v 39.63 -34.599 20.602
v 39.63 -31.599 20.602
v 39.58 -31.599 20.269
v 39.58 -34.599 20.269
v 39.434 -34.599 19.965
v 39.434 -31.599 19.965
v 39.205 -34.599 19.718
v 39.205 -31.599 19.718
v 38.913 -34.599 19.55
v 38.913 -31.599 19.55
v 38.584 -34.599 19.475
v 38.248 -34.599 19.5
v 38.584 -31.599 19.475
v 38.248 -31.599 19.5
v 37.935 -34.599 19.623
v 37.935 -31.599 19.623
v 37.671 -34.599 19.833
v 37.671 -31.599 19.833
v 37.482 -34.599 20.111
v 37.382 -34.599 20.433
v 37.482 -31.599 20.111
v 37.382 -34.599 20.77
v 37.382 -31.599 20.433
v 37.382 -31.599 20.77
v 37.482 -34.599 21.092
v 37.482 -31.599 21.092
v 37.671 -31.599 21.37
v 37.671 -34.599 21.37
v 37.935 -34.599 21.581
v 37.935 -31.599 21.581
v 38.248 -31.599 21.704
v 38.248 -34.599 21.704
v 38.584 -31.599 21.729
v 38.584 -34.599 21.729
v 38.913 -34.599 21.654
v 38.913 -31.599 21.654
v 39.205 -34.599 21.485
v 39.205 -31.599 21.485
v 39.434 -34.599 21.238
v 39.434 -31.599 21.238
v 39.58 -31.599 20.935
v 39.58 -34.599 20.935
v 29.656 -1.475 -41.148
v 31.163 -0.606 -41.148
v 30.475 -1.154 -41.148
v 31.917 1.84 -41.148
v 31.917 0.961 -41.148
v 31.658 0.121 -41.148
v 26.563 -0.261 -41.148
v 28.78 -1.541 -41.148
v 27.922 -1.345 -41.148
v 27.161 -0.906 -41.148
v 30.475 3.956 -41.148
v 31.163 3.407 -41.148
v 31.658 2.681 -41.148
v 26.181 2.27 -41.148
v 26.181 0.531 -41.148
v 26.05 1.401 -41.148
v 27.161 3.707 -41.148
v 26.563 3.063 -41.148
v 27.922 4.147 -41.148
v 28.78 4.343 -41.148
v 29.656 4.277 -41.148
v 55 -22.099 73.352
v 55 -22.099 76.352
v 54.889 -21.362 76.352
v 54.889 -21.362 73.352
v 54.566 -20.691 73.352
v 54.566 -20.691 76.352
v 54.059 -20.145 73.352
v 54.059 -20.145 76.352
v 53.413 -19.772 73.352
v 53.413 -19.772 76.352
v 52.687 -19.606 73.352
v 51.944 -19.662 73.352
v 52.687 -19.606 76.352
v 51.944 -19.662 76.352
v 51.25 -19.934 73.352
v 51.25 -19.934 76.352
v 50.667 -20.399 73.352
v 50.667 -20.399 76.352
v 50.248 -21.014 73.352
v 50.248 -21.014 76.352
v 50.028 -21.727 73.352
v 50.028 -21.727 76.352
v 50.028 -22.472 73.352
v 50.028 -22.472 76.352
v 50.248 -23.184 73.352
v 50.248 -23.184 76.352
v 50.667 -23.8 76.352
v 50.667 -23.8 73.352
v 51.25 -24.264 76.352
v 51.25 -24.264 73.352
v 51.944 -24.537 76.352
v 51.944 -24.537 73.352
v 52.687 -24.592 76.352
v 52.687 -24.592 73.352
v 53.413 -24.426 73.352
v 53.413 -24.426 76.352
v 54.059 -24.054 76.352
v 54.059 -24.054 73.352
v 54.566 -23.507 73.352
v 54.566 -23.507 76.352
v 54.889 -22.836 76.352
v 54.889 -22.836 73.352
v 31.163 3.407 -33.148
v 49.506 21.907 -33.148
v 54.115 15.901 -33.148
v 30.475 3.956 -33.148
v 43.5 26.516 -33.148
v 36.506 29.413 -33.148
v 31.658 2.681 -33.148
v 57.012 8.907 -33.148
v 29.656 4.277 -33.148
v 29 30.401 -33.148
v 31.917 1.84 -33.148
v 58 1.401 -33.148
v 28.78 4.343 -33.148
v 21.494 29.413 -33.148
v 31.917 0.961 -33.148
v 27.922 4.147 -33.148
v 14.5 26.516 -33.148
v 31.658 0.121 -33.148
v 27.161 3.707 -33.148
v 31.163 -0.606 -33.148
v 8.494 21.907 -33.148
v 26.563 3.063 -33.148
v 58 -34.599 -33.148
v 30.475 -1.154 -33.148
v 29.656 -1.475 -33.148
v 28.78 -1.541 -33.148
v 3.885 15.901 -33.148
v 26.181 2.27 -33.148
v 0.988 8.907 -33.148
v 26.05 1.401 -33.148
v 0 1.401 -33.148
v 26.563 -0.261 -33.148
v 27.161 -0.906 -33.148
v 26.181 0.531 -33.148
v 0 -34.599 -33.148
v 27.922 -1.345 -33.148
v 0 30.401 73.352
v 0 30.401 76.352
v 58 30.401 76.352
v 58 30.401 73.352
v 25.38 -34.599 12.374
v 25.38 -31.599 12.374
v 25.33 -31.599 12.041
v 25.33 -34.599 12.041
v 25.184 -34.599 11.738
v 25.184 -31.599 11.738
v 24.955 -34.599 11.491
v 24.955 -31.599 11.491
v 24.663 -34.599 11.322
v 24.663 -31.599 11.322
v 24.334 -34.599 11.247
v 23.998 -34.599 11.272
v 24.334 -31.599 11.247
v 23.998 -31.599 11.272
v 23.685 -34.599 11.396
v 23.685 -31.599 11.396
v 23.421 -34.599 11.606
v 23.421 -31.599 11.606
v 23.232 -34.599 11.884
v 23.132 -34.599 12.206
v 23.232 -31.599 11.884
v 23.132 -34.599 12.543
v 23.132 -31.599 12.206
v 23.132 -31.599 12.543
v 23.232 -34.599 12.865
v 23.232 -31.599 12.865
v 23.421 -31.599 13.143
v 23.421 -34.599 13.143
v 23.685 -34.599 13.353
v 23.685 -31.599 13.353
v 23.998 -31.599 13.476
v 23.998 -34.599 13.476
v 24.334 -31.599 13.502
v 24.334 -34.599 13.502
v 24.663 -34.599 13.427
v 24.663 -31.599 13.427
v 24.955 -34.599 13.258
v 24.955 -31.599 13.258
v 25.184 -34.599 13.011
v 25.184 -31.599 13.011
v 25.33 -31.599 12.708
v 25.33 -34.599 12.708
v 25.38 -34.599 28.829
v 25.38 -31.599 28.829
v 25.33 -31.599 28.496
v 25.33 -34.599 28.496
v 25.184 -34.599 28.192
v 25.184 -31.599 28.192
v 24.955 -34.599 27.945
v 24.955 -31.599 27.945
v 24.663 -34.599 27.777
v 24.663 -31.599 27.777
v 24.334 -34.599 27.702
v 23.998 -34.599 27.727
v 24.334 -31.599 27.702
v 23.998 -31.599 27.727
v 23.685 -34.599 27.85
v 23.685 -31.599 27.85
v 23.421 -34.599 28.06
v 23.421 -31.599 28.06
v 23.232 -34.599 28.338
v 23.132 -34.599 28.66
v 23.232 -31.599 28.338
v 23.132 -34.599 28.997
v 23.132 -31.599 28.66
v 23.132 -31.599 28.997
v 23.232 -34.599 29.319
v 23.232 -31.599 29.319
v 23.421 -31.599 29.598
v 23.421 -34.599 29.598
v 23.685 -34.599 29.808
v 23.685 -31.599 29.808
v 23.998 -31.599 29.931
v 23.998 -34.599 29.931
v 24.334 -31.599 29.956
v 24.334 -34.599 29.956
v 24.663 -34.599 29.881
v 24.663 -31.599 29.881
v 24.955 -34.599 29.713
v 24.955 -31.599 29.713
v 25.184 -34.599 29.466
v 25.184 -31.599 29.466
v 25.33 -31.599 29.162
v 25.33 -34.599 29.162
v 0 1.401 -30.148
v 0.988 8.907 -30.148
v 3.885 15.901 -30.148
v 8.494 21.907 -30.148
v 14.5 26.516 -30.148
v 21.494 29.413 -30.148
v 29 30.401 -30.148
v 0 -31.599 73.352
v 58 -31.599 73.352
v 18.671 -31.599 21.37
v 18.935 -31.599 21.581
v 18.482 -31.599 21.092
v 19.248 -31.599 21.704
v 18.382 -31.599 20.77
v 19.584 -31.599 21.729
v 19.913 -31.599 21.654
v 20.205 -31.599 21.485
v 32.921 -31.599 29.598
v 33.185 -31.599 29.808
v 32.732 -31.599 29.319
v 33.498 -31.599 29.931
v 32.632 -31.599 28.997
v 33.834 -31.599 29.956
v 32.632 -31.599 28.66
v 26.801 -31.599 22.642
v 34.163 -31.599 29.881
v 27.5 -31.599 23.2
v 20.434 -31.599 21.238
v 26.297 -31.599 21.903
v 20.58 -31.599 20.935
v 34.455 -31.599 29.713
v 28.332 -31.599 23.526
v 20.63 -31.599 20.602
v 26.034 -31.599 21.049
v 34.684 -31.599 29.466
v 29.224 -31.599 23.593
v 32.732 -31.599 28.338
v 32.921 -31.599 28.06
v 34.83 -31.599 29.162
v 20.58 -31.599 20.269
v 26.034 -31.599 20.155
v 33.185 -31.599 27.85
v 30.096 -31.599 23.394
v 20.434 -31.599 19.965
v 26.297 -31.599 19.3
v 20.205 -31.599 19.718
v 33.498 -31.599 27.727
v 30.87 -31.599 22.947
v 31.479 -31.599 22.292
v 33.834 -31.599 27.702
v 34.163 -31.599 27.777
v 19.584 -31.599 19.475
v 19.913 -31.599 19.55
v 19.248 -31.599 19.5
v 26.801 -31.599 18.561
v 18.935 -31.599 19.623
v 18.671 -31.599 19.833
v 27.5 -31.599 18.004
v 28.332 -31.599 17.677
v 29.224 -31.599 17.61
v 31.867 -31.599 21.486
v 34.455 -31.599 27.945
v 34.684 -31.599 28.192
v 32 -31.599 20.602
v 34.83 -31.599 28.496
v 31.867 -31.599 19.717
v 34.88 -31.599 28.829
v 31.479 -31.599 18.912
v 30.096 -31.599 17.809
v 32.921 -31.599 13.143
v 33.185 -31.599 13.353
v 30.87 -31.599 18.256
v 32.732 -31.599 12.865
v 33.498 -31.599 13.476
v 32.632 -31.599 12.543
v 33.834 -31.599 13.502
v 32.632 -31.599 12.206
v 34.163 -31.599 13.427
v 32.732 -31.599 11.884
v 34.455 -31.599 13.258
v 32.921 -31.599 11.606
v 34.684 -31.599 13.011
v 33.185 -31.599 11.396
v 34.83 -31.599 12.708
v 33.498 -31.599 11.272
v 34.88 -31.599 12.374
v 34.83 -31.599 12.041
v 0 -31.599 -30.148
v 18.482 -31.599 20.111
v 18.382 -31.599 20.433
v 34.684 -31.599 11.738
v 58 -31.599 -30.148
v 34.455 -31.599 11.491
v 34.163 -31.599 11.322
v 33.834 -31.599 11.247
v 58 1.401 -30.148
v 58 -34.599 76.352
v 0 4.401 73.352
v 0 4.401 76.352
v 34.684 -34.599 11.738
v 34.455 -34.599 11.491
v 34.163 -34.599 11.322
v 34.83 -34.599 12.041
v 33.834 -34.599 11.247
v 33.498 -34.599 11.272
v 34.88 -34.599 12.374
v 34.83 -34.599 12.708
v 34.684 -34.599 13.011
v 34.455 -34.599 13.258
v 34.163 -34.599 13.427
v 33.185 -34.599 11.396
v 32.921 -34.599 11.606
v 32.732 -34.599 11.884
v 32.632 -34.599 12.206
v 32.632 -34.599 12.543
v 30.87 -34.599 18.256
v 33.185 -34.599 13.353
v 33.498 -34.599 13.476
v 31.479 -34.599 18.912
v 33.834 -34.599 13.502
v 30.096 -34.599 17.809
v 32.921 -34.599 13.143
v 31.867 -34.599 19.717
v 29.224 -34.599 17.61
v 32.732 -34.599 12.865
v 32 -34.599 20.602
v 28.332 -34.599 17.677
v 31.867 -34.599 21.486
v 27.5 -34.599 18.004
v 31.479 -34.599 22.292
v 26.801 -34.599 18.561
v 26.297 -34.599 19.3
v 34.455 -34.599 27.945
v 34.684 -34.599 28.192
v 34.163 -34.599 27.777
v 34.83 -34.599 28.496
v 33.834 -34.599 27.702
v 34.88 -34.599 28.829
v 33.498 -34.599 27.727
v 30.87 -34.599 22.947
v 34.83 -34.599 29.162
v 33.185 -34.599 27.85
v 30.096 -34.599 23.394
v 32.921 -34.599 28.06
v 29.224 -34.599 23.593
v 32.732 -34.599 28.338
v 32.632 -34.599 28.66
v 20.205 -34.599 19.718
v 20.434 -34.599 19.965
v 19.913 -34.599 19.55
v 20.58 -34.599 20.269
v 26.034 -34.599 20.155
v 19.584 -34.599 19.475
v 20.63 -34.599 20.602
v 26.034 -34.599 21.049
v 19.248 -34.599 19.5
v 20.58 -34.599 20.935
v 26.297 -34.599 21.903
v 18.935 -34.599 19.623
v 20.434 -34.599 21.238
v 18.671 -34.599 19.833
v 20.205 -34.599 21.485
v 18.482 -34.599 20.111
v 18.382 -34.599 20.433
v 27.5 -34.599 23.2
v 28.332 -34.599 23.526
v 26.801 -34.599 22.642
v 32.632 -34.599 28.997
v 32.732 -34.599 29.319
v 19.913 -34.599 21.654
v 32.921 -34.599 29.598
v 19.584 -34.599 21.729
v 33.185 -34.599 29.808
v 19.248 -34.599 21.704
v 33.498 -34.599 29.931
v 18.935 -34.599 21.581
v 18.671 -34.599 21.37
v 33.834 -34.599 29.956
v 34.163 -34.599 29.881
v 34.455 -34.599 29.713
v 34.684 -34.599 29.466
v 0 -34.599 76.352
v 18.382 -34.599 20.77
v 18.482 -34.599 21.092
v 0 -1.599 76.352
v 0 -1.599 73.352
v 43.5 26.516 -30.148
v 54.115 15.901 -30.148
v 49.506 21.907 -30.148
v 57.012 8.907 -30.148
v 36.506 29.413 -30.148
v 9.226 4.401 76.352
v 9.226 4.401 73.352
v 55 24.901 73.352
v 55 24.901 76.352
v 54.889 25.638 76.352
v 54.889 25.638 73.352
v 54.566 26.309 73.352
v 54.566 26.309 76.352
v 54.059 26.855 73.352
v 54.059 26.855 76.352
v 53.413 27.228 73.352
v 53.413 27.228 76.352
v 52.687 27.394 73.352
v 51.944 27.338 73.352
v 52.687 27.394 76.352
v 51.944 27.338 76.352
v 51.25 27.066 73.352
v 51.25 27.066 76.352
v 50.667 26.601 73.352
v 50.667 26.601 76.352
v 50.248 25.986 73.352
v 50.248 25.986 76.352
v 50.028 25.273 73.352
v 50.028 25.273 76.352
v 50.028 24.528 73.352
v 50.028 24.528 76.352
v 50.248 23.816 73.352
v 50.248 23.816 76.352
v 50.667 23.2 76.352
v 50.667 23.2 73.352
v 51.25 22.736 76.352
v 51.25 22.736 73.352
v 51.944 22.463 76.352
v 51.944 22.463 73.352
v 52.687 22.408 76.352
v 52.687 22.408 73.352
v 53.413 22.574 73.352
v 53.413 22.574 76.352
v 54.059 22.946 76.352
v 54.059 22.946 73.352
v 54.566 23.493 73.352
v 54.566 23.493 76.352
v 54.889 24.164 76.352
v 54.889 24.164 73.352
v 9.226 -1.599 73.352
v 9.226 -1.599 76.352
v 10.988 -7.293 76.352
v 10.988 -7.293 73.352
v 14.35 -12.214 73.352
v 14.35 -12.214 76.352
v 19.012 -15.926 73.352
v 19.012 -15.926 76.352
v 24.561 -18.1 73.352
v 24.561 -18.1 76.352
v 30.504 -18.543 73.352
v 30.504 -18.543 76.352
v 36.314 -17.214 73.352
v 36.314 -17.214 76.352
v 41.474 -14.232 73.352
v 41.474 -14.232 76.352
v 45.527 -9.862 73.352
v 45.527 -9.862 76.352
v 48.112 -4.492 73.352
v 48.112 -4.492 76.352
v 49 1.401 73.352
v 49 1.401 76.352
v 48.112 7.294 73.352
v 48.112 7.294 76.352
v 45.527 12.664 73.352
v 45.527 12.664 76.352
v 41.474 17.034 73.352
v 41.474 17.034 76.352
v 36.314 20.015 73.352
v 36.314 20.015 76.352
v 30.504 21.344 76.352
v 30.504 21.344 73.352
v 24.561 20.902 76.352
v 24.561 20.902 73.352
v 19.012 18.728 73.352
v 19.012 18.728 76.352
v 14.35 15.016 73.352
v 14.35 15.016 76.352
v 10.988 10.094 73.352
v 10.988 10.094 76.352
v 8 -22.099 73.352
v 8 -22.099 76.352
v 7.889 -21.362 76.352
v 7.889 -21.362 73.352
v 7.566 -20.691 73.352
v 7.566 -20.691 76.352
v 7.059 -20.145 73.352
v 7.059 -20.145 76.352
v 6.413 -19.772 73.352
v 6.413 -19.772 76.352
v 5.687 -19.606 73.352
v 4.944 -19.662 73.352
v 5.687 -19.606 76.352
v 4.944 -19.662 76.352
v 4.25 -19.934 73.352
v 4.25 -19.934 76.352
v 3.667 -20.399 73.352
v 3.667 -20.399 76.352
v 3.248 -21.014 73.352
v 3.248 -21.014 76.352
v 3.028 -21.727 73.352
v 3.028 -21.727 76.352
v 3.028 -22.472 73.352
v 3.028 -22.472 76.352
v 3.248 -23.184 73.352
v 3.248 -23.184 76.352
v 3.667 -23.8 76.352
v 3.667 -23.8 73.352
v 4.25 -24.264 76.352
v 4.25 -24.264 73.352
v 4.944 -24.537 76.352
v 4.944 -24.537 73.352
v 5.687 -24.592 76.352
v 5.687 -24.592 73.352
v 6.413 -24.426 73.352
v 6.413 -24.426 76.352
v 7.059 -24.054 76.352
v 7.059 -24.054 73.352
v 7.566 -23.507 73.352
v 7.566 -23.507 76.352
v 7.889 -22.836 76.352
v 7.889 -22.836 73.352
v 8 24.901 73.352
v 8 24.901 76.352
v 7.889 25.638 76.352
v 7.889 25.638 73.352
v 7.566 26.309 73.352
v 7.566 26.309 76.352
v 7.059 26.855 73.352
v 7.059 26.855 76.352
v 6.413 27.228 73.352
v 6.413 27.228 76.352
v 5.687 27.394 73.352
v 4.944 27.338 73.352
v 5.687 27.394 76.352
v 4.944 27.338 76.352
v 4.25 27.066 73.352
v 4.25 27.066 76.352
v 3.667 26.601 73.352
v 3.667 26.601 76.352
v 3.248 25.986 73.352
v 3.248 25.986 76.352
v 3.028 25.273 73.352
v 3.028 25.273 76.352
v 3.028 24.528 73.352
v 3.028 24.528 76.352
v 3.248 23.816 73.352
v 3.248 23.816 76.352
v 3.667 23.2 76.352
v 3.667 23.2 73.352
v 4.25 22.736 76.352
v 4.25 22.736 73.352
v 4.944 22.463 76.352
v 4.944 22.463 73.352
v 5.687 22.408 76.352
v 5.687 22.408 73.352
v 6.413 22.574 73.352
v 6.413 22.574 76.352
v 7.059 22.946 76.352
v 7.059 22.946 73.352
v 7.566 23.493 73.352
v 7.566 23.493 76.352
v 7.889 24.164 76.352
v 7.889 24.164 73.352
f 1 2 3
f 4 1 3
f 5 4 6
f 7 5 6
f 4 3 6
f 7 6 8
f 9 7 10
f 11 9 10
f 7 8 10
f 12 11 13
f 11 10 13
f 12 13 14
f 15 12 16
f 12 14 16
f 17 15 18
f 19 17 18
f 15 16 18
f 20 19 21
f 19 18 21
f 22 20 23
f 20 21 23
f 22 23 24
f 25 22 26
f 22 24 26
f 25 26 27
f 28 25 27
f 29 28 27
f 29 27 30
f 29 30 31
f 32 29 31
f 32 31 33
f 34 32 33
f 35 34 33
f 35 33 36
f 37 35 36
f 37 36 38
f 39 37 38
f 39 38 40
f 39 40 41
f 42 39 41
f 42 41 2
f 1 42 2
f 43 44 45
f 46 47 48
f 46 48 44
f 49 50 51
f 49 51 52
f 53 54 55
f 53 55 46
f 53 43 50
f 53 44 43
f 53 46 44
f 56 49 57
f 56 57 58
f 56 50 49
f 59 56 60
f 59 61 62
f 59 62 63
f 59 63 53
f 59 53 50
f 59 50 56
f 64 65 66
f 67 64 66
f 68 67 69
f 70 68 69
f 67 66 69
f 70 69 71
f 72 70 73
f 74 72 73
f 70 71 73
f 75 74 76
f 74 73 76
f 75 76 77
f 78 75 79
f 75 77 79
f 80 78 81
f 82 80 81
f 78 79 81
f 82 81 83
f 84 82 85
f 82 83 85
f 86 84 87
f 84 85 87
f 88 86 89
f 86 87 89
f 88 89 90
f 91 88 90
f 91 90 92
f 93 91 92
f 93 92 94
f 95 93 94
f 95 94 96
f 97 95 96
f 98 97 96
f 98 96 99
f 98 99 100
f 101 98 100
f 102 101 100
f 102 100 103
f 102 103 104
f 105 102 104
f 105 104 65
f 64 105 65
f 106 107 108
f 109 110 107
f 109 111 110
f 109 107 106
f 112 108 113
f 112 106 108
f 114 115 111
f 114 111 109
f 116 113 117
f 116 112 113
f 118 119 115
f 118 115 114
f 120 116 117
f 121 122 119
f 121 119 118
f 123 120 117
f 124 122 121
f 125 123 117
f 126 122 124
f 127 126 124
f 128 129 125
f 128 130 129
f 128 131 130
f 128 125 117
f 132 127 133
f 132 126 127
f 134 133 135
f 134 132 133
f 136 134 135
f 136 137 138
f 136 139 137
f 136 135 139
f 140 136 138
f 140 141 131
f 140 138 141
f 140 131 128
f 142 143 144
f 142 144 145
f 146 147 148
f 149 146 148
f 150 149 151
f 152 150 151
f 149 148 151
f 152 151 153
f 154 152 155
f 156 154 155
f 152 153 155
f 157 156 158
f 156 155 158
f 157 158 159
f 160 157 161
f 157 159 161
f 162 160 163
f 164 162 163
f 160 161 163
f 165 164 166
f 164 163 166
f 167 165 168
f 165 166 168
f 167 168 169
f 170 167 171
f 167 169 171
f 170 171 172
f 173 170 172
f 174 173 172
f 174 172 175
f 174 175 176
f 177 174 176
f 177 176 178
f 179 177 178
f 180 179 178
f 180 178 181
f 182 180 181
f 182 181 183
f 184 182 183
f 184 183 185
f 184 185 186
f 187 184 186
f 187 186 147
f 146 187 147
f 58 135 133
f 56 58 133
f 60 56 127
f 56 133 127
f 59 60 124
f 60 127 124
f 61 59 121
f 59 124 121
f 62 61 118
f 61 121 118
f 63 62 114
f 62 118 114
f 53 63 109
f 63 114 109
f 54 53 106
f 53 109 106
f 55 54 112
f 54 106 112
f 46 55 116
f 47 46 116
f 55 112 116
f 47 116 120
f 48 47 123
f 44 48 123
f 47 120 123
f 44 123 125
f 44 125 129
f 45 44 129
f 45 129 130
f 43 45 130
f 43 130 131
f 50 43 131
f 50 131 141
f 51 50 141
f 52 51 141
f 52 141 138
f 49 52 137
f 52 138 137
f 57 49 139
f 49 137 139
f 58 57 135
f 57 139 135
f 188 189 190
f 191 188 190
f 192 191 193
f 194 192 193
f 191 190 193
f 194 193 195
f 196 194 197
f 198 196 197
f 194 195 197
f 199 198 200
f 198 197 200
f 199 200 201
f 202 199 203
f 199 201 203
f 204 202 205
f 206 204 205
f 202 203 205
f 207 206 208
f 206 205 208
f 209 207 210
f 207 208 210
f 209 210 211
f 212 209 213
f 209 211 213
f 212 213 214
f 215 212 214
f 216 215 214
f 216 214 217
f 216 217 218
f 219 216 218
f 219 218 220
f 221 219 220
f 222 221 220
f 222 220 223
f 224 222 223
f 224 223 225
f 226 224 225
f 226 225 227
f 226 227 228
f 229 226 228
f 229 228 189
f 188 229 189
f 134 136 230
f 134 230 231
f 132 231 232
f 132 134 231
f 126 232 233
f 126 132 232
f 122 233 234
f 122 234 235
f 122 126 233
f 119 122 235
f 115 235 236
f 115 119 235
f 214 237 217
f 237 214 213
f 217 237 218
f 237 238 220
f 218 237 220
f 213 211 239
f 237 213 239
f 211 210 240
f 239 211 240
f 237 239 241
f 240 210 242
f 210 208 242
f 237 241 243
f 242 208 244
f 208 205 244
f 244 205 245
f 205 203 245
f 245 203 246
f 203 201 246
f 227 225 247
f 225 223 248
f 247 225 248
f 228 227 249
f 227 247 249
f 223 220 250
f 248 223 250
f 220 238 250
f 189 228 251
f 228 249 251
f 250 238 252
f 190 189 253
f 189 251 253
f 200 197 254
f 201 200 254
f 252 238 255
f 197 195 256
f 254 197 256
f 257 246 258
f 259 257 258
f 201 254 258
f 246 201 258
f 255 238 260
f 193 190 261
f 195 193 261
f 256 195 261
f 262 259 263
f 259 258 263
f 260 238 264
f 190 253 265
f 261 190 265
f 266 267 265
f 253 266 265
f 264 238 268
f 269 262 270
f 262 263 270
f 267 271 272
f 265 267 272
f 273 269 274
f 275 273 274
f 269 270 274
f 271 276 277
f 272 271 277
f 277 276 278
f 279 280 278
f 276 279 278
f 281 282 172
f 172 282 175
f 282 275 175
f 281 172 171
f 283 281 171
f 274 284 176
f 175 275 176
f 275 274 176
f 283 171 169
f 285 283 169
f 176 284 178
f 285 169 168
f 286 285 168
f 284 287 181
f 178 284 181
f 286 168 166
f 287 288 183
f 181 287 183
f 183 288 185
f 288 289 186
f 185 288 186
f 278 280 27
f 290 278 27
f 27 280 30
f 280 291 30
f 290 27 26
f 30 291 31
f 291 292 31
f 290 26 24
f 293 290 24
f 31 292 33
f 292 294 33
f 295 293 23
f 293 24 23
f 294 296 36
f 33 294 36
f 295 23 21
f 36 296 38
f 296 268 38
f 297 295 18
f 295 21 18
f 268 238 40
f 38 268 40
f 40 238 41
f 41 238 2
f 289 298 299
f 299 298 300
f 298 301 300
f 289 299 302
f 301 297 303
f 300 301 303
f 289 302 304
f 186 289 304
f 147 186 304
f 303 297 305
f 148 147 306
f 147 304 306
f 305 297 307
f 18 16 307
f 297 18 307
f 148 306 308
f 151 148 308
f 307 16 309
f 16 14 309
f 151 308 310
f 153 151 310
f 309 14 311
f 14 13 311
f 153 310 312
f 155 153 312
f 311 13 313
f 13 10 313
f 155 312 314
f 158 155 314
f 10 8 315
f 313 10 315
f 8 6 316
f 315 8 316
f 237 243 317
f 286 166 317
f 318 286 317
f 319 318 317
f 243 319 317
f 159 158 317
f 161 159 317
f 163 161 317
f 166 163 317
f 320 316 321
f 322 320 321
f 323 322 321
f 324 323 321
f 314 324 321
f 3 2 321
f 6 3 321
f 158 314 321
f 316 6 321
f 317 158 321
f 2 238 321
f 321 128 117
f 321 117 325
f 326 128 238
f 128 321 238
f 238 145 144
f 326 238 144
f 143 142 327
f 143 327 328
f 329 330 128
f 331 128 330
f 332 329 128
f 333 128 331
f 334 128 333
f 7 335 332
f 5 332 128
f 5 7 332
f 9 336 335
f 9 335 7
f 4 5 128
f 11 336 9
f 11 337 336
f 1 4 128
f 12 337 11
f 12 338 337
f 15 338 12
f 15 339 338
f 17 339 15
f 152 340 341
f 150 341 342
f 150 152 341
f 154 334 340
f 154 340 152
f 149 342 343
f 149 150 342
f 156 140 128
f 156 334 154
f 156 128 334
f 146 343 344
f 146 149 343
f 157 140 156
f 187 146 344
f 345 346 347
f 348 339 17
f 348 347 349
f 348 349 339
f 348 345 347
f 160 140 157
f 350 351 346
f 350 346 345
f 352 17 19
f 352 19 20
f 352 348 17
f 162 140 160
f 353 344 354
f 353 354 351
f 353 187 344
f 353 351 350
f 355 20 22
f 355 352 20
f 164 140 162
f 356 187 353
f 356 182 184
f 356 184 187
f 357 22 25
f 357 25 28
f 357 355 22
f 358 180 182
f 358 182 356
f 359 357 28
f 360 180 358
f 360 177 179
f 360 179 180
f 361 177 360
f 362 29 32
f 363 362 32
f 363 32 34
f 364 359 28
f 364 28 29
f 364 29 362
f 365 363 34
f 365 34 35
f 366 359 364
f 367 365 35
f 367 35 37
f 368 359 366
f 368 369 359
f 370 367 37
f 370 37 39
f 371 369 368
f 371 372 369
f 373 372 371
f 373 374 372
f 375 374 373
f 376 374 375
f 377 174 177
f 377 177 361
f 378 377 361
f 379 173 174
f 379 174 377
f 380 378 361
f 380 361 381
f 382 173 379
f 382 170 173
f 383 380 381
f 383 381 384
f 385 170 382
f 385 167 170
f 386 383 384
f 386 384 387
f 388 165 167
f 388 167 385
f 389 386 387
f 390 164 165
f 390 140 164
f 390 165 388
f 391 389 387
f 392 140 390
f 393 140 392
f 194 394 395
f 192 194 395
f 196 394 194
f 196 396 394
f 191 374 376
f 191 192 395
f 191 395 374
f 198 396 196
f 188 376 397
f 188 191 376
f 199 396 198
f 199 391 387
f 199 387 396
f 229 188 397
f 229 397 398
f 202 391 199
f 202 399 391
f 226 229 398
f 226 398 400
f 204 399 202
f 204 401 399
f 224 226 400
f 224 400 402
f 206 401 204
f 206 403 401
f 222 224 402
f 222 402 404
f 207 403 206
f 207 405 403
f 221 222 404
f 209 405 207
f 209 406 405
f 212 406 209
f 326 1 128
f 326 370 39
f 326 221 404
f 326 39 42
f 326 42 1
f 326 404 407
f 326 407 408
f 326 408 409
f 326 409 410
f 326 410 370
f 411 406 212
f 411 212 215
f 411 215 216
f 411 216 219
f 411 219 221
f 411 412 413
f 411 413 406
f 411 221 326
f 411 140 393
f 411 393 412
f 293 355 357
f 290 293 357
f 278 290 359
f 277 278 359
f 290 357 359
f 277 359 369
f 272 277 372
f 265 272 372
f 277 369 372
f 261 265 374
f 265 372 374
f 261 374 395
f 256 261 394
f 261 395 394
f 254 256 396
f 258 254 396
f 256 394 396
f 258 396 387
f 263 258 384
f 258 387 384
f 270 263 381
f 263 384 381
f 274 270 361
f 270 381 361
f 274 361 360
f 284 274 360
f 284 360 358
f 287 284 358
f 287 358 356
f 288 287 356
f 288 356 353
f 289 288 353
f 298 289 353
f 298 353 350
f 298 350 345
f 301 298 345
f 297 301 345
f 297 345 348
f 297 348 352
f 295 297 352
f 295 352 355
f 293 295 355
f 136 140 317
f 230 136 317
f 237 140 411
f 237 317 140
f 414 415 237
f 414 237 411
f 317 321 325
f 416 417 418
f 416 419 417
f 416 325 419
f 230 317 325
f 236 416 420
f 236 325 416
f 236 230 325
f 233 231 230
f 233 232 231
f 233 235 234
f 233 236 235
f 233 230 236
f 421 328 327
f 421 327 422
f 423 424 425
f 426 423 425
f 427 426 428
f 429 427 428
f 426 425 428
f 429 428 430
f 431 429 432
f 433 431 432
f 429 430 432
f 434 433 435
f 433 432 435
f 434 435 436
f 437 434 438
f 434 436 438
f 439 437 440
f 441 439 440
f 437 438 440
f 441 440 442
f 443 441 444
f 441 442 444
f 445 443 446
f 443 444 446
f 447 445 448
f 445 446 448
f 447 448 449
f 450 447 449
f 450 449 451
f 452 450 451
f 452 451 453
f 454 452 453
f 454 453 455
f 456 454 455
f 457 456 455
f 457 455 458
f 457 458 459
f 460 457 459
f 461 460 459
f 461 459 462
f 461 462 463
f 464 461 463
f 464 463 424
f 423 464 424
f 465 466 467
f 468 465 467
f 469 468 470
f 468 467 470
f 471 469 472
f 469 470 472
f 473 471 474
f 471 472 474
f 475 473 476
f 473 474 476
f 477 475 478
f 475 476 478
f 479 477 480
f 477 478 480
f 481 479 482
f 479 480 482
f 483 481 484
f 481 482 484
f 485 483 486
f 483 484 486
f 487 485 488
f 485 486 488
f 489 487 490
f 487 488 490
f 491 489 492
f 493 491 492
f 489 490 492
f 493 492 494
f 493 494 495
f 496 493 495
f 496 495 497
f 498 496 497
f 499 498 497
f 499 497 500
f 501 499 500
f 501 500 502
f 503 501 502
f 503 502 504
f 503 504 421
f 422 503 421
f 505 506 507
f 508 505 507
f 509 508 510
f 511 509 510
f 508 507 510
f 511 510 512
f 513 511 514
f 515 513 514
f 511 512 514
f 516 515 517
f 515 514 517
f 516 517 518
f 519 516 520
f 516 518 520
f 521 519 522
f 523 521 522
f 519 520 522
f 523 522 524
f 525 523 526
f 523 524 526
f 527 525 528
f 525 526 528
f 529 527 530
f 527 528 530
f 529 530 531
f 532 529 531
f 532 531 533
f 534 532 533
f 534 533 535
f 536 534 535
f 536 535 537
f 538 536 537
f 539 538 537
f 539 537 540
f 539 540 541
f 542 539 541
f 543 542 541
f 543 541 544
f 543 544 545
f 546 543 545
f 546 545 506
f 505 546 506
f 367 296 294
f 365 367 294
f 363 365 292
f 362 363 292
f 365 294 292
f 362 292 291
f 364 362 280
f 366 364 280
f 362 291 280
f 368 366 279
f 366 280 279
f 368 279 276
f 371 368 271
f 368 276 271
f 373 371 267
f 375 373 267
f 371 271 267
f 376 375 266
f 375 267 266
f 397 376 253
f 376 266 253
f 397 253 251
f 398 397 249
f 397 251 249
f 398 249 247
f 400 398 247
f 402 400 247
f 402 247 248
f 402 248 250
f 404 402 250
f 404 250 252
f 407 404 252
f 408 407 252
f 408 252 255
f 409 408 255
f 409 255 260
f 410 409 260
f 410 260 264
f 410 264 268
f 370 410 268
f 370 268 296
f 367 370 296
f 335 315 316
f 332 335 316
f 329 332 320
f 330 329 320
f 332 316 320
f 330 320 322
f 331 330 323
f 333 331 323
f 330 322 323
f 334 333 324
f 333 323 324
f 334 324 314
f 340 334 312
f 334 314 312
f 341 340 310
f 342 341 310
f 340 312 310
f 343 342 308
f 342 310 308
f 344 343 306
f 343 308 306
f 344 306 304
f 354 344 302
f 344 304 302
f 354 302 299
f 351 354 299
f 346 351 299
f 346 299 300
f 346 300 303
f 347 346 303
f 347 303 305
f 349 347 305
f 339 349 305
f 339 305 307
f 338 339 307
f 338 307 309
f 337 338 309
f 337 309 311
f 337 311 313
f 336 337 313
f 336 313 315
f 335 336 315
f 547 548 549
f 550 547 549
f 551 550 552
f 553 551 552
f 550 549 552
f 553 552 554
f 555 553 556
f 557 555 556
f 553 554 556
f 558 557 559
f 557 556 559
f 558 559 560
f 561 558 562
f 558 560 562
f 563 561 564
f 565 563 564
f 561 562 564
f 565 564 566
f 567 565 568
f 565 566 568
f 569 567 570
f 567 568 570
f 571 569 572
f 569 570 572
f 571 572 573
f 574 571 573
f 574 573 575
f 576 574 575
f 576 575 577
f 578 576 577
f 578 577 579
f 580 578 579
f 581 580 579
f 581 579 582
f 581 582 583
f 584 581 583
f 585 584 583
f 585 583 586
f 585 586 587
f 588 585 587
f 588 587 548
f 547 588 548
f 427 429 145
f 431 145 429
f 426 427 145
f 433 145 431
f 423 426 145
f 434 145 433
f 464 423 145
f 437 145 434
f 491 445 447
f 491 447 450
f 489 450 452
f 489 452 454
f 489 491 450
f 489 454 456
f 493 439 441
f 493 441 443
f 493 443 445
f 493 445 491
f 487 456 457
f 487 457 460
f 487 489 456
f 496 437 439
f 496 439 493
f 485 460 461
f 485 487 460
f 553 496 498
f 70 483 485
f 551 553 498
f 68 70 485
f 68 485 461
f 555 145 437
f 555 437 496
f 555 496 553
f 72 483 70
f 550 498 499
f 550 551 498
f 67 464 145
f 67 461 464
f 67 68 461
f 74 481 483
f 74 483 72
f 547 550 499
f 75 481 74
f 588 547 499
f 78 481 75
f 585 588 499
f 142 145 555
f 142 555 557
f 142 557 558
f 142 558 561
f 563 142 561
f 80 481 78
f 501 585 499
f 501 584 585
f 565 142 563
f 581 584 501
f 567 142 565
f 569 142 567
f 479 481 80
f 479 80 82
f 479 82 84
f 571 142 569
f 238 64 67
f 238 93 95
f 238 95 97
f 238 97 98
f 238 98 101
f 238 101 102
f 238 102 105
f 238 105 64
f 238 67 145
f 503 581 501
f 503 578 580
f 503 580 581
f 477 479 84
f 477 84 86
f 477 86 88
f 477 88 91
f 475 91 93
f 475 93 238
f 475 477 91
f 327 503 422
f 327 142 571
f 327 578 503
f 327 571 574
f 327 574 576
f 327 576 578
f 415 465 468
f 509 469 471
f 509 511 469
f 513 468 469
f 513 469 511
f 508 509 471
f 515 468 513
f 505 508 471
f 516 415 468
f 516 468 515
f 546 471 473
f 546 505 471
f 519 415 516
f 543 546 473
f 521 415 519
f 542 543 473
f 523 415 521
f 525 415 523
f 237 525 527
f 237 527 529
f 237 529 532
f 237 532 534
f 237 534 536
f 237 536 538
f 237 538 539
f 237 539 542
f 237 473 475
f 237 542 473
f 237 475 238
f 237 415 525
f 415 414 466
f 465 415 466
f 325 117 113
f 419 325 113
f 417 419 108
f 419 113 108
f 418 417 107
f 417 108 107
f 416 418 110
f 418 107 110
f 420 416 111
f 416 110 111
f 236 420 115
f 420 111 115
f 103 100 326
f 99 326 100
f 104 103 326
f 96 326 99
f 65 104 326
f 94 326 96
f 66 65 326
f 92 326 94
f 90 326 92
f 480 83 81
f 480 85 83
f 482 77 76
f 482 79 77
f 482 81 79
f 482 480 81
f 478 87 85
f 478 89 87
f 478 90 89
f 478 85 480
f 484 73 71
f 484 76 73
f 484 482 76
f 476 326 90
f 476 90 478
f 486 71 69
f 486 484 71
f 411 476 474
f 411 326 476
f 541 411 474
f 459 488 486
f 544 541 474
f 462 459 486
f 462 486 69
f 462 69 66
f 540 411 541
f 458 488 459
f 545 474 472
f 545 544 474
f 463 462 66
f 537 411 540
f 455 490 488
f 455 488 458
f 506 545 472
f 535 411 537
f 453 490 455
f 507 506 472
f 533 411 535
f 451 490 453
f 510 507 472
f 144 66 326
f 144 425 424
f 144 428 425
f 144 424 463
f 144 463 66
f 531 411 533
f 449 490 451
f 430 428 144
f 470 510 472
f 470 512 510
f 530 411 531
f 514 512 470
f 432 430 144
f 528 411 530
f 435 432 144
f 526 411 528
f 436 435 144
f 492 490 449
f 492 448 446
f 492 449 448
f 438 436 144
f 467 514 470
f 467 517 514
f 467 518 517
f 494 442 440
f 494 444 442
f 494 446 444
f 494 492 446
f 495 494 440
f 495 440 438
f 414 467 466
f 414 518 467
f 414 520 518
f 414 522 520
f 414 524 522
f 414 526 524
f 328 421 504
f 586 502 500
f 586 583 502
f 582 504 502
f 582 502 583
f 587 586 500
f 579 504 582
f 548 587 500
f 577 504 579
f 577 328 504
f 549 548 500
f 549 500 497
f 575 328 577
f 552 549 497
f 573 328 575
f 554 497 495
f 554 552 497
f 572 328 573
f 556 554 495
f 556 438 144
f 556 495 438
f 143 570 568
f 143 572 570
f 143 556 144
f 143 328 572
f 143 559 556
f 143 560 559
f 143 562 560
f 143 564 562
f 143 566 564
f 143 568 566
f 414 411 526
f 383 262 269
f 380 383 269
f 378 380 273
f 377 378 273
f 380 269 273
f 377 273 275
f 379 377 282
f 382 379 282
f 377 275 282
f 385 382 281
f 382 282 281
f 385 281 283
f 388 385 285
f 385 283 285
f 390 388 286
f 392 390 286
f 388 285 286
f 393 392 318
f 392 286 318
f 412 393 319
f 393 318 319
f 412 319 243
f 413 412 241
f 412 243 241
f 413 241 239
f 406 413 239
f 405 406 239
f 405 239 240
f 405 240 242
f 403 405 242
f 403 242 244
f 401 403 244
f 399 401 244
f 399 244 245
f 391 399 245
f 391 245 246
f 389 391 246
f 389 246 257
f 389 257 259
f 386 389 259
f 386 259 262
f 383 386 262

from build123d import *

# Parameters (mm, degrees)
BOSS_EXTRUDE1_DEPTH       = 58
SKETCH2_R                 = 2.5
SKETCH2_R_2               = 20
CUT_EXTRUDE1_DEPTH        = 58
CUT_EXTRUDE2_DEPTH        = 58
CUT_EXTRUDE3_DEPTH        = 58
SKETCH5_R                 = 2.95
BOSS_EXTRUDE2_DEPTH       = 8
SKETCH7_W                 = 29
SKETCH7_H                 = 6
CUT_EXTRUDE5_DEPTH        = 10
F_4_40_TAPPED_HOLE4_D     = 2.2606
F_4_40_TAPPED_HOLE4_DEPTH = 7.6
F_4_40_TAPPED_HOLE4_TIP   = 0.679152758
SKETCH25_R                = 3
CUT_EXTRUDE6_DEPTH        = 10
SKETCH26_W                = 103.5
SKETCH26_H                = 2
CUT_EXTRUDE7_DEPTH        = 90


with BuildPart() as part:
    # Sketch1 → Boss-Extrude1 (new body)
    with BuildSketch(Plane(origin=(0, 0, 0), x_dir=(0, 0, -1), z_dir=(1, 0, 0))):
        Polygon((-73.351671883, 30.400809615), (-73.351671883, -29.599190385), (30.148328117, -29.599190385), (30.148328117, 30.400809615), (33.148328117, 30.400809615), (33.148328117, -34.599190385), (-76.351671883, -34.599190385), (-76.351671883, 30.400809615), align=None)
    extrude(amount=BOSS_EXTRUDE1_DEPTH)

    # Sketch2 → Cut-Extrude1 (cut)
    with BuildSketch(Plane.XY.offset(76.351671883)):
        with Locations((5.5, 24.900809615)):
            Circle(SKETCH2_R)
        with Locations((52.5, 24.900809615)):
            Circle(SKETCH2_R)
        with Locations((52.5, -22.099190385)):
            Circle(SKETCH2_R)
        with Locations((5.5, -22.099190385)):
            Circle(SKETCH2_R)
        with Locations((29, 1.400809615)):
            Circle(SKETCH2_R_2)
    extrude(amount=-CUT_EXTRUDE1_DEPTH, mode=Mode.SUBTRACT)

    # Sketch3 → Cut-Extrude2 (cut)
    with BuildSketch(Plane(origin=(0, 0, -33.148328117), x_dir=(-1, 0, 0), z_dir=(0, 0, -1))):
        with BuildLine():
            Line((-29, 30.400809615), (-58, 30.400809615))
            Line((-58, 30.400809615), (-58, 1.400809615))
            ThreePointArc((-58, 1.400809615), (-49.506096654, 21.90690627), (-29, 30.400809615))
        make_face()
    extrude(amount=-CUT_EXTRUDE2_DEPTH, mode=Mode.SUBTRACT)

    # Sketch4 → Cut-Extrude3 (cut)
    with BuildSketch(Plane(origin=(0, 0, -33.148328117), x_dir=(-1, 0, 0), z_dir=(0, 0, -1))):
        with BuildLine():
            Line((-29, 30.400809615), (0, 30.400809615))
            Line((0, 30.400809615), (0, 1.400809615))
            ThreePointArc((0, 1.400809615), (-8.493903346, 21.90690627), (-29, 30.400809615))
        make_face()
    extrude(amount=-CUT_EXTRUDE3_DEPTH, mode=Mode.SUBTRACT)

    # Sketch5 → Boss-Extrude2 (add)
    with BuildSketch(Plane(origin=(0, 0, -33.148328117), x_dir=(-1, 0, 0), z_dir=(0, 0, -1))):
        with Locations((-29, 1.400809615)):
            Circle(SKETCH5_R)
    extrude(amount=BOSS_EXTRUDE2_DEPTH)

    # Sketch7 → Cut-Extrude5 (cut)
    with BuildSketch(Plane.XY.offset(76.351671883)):
        with Locations((14.5, 1.400809615)):
            Rectangle(SKETCH7_W, SKETCH7_H)
    extrude(amount=-CUT_EXTRUDE5_DEPTH, mode=Mode.SUBTRACT)

    # #4-40 Tapped Hole4
    with Locations(Plane(origin=(0, -34.599190385, 0), x_dir=(-1, 0, 0), z_dir=(0, -1, 0))):
        with Locations((-19.5, -20.601671883), (-24.25, -28.828913219), (-33.75, -28.828913219), (-38.5, -20.601671883), (-33.75, -12.374430547), (-24.25, -12.374430547)):
            Hole(F_4_40_TAPPED_HOLE4_D / 2, depth=F_4_40_TAPPED_HOLE4_DEPTH)
            with Locations((0, 0, -(F_4_40_TAPPED_HOLE4_DEPTH + F_4_40_TAPPED_HOLE4_TIP / 2))):  # 118° drill point
                Cone(0, F_4_40_TAPPED_HOLE4_D / 2, F_4_40_TAPPED_HOLE4_TIP, mode=Mode.SUBTRACT)

    # Sketch25 → Cut-Extrude6 (cut)
    with BuildSketch(Plane.XZ.offset(34.599190385)):
        with Locations((29, 20.601671883)):
            Circle(SKETCH25_R)
    extrude(amount=-CUT_EXTRUDE6_DEPTH, mode=Mode.SUBTRACT)

    # Sketch26 → Cut-Extrude7 (cut)
    with BuildSketch(Plane(origin=(58, 0, 0), x_dir=(0, 0, -1), z_dir=(1, 0, 0))):
        with Locations((-21.601671883, -30.599190385)):
            Rectangle(SKETCH26_W, SKETCH26_H)
    extrude(amount=-CUT_EXTRUDE7_DEPTH, mode=Mode.SUBTRACT)


solid = part.part
